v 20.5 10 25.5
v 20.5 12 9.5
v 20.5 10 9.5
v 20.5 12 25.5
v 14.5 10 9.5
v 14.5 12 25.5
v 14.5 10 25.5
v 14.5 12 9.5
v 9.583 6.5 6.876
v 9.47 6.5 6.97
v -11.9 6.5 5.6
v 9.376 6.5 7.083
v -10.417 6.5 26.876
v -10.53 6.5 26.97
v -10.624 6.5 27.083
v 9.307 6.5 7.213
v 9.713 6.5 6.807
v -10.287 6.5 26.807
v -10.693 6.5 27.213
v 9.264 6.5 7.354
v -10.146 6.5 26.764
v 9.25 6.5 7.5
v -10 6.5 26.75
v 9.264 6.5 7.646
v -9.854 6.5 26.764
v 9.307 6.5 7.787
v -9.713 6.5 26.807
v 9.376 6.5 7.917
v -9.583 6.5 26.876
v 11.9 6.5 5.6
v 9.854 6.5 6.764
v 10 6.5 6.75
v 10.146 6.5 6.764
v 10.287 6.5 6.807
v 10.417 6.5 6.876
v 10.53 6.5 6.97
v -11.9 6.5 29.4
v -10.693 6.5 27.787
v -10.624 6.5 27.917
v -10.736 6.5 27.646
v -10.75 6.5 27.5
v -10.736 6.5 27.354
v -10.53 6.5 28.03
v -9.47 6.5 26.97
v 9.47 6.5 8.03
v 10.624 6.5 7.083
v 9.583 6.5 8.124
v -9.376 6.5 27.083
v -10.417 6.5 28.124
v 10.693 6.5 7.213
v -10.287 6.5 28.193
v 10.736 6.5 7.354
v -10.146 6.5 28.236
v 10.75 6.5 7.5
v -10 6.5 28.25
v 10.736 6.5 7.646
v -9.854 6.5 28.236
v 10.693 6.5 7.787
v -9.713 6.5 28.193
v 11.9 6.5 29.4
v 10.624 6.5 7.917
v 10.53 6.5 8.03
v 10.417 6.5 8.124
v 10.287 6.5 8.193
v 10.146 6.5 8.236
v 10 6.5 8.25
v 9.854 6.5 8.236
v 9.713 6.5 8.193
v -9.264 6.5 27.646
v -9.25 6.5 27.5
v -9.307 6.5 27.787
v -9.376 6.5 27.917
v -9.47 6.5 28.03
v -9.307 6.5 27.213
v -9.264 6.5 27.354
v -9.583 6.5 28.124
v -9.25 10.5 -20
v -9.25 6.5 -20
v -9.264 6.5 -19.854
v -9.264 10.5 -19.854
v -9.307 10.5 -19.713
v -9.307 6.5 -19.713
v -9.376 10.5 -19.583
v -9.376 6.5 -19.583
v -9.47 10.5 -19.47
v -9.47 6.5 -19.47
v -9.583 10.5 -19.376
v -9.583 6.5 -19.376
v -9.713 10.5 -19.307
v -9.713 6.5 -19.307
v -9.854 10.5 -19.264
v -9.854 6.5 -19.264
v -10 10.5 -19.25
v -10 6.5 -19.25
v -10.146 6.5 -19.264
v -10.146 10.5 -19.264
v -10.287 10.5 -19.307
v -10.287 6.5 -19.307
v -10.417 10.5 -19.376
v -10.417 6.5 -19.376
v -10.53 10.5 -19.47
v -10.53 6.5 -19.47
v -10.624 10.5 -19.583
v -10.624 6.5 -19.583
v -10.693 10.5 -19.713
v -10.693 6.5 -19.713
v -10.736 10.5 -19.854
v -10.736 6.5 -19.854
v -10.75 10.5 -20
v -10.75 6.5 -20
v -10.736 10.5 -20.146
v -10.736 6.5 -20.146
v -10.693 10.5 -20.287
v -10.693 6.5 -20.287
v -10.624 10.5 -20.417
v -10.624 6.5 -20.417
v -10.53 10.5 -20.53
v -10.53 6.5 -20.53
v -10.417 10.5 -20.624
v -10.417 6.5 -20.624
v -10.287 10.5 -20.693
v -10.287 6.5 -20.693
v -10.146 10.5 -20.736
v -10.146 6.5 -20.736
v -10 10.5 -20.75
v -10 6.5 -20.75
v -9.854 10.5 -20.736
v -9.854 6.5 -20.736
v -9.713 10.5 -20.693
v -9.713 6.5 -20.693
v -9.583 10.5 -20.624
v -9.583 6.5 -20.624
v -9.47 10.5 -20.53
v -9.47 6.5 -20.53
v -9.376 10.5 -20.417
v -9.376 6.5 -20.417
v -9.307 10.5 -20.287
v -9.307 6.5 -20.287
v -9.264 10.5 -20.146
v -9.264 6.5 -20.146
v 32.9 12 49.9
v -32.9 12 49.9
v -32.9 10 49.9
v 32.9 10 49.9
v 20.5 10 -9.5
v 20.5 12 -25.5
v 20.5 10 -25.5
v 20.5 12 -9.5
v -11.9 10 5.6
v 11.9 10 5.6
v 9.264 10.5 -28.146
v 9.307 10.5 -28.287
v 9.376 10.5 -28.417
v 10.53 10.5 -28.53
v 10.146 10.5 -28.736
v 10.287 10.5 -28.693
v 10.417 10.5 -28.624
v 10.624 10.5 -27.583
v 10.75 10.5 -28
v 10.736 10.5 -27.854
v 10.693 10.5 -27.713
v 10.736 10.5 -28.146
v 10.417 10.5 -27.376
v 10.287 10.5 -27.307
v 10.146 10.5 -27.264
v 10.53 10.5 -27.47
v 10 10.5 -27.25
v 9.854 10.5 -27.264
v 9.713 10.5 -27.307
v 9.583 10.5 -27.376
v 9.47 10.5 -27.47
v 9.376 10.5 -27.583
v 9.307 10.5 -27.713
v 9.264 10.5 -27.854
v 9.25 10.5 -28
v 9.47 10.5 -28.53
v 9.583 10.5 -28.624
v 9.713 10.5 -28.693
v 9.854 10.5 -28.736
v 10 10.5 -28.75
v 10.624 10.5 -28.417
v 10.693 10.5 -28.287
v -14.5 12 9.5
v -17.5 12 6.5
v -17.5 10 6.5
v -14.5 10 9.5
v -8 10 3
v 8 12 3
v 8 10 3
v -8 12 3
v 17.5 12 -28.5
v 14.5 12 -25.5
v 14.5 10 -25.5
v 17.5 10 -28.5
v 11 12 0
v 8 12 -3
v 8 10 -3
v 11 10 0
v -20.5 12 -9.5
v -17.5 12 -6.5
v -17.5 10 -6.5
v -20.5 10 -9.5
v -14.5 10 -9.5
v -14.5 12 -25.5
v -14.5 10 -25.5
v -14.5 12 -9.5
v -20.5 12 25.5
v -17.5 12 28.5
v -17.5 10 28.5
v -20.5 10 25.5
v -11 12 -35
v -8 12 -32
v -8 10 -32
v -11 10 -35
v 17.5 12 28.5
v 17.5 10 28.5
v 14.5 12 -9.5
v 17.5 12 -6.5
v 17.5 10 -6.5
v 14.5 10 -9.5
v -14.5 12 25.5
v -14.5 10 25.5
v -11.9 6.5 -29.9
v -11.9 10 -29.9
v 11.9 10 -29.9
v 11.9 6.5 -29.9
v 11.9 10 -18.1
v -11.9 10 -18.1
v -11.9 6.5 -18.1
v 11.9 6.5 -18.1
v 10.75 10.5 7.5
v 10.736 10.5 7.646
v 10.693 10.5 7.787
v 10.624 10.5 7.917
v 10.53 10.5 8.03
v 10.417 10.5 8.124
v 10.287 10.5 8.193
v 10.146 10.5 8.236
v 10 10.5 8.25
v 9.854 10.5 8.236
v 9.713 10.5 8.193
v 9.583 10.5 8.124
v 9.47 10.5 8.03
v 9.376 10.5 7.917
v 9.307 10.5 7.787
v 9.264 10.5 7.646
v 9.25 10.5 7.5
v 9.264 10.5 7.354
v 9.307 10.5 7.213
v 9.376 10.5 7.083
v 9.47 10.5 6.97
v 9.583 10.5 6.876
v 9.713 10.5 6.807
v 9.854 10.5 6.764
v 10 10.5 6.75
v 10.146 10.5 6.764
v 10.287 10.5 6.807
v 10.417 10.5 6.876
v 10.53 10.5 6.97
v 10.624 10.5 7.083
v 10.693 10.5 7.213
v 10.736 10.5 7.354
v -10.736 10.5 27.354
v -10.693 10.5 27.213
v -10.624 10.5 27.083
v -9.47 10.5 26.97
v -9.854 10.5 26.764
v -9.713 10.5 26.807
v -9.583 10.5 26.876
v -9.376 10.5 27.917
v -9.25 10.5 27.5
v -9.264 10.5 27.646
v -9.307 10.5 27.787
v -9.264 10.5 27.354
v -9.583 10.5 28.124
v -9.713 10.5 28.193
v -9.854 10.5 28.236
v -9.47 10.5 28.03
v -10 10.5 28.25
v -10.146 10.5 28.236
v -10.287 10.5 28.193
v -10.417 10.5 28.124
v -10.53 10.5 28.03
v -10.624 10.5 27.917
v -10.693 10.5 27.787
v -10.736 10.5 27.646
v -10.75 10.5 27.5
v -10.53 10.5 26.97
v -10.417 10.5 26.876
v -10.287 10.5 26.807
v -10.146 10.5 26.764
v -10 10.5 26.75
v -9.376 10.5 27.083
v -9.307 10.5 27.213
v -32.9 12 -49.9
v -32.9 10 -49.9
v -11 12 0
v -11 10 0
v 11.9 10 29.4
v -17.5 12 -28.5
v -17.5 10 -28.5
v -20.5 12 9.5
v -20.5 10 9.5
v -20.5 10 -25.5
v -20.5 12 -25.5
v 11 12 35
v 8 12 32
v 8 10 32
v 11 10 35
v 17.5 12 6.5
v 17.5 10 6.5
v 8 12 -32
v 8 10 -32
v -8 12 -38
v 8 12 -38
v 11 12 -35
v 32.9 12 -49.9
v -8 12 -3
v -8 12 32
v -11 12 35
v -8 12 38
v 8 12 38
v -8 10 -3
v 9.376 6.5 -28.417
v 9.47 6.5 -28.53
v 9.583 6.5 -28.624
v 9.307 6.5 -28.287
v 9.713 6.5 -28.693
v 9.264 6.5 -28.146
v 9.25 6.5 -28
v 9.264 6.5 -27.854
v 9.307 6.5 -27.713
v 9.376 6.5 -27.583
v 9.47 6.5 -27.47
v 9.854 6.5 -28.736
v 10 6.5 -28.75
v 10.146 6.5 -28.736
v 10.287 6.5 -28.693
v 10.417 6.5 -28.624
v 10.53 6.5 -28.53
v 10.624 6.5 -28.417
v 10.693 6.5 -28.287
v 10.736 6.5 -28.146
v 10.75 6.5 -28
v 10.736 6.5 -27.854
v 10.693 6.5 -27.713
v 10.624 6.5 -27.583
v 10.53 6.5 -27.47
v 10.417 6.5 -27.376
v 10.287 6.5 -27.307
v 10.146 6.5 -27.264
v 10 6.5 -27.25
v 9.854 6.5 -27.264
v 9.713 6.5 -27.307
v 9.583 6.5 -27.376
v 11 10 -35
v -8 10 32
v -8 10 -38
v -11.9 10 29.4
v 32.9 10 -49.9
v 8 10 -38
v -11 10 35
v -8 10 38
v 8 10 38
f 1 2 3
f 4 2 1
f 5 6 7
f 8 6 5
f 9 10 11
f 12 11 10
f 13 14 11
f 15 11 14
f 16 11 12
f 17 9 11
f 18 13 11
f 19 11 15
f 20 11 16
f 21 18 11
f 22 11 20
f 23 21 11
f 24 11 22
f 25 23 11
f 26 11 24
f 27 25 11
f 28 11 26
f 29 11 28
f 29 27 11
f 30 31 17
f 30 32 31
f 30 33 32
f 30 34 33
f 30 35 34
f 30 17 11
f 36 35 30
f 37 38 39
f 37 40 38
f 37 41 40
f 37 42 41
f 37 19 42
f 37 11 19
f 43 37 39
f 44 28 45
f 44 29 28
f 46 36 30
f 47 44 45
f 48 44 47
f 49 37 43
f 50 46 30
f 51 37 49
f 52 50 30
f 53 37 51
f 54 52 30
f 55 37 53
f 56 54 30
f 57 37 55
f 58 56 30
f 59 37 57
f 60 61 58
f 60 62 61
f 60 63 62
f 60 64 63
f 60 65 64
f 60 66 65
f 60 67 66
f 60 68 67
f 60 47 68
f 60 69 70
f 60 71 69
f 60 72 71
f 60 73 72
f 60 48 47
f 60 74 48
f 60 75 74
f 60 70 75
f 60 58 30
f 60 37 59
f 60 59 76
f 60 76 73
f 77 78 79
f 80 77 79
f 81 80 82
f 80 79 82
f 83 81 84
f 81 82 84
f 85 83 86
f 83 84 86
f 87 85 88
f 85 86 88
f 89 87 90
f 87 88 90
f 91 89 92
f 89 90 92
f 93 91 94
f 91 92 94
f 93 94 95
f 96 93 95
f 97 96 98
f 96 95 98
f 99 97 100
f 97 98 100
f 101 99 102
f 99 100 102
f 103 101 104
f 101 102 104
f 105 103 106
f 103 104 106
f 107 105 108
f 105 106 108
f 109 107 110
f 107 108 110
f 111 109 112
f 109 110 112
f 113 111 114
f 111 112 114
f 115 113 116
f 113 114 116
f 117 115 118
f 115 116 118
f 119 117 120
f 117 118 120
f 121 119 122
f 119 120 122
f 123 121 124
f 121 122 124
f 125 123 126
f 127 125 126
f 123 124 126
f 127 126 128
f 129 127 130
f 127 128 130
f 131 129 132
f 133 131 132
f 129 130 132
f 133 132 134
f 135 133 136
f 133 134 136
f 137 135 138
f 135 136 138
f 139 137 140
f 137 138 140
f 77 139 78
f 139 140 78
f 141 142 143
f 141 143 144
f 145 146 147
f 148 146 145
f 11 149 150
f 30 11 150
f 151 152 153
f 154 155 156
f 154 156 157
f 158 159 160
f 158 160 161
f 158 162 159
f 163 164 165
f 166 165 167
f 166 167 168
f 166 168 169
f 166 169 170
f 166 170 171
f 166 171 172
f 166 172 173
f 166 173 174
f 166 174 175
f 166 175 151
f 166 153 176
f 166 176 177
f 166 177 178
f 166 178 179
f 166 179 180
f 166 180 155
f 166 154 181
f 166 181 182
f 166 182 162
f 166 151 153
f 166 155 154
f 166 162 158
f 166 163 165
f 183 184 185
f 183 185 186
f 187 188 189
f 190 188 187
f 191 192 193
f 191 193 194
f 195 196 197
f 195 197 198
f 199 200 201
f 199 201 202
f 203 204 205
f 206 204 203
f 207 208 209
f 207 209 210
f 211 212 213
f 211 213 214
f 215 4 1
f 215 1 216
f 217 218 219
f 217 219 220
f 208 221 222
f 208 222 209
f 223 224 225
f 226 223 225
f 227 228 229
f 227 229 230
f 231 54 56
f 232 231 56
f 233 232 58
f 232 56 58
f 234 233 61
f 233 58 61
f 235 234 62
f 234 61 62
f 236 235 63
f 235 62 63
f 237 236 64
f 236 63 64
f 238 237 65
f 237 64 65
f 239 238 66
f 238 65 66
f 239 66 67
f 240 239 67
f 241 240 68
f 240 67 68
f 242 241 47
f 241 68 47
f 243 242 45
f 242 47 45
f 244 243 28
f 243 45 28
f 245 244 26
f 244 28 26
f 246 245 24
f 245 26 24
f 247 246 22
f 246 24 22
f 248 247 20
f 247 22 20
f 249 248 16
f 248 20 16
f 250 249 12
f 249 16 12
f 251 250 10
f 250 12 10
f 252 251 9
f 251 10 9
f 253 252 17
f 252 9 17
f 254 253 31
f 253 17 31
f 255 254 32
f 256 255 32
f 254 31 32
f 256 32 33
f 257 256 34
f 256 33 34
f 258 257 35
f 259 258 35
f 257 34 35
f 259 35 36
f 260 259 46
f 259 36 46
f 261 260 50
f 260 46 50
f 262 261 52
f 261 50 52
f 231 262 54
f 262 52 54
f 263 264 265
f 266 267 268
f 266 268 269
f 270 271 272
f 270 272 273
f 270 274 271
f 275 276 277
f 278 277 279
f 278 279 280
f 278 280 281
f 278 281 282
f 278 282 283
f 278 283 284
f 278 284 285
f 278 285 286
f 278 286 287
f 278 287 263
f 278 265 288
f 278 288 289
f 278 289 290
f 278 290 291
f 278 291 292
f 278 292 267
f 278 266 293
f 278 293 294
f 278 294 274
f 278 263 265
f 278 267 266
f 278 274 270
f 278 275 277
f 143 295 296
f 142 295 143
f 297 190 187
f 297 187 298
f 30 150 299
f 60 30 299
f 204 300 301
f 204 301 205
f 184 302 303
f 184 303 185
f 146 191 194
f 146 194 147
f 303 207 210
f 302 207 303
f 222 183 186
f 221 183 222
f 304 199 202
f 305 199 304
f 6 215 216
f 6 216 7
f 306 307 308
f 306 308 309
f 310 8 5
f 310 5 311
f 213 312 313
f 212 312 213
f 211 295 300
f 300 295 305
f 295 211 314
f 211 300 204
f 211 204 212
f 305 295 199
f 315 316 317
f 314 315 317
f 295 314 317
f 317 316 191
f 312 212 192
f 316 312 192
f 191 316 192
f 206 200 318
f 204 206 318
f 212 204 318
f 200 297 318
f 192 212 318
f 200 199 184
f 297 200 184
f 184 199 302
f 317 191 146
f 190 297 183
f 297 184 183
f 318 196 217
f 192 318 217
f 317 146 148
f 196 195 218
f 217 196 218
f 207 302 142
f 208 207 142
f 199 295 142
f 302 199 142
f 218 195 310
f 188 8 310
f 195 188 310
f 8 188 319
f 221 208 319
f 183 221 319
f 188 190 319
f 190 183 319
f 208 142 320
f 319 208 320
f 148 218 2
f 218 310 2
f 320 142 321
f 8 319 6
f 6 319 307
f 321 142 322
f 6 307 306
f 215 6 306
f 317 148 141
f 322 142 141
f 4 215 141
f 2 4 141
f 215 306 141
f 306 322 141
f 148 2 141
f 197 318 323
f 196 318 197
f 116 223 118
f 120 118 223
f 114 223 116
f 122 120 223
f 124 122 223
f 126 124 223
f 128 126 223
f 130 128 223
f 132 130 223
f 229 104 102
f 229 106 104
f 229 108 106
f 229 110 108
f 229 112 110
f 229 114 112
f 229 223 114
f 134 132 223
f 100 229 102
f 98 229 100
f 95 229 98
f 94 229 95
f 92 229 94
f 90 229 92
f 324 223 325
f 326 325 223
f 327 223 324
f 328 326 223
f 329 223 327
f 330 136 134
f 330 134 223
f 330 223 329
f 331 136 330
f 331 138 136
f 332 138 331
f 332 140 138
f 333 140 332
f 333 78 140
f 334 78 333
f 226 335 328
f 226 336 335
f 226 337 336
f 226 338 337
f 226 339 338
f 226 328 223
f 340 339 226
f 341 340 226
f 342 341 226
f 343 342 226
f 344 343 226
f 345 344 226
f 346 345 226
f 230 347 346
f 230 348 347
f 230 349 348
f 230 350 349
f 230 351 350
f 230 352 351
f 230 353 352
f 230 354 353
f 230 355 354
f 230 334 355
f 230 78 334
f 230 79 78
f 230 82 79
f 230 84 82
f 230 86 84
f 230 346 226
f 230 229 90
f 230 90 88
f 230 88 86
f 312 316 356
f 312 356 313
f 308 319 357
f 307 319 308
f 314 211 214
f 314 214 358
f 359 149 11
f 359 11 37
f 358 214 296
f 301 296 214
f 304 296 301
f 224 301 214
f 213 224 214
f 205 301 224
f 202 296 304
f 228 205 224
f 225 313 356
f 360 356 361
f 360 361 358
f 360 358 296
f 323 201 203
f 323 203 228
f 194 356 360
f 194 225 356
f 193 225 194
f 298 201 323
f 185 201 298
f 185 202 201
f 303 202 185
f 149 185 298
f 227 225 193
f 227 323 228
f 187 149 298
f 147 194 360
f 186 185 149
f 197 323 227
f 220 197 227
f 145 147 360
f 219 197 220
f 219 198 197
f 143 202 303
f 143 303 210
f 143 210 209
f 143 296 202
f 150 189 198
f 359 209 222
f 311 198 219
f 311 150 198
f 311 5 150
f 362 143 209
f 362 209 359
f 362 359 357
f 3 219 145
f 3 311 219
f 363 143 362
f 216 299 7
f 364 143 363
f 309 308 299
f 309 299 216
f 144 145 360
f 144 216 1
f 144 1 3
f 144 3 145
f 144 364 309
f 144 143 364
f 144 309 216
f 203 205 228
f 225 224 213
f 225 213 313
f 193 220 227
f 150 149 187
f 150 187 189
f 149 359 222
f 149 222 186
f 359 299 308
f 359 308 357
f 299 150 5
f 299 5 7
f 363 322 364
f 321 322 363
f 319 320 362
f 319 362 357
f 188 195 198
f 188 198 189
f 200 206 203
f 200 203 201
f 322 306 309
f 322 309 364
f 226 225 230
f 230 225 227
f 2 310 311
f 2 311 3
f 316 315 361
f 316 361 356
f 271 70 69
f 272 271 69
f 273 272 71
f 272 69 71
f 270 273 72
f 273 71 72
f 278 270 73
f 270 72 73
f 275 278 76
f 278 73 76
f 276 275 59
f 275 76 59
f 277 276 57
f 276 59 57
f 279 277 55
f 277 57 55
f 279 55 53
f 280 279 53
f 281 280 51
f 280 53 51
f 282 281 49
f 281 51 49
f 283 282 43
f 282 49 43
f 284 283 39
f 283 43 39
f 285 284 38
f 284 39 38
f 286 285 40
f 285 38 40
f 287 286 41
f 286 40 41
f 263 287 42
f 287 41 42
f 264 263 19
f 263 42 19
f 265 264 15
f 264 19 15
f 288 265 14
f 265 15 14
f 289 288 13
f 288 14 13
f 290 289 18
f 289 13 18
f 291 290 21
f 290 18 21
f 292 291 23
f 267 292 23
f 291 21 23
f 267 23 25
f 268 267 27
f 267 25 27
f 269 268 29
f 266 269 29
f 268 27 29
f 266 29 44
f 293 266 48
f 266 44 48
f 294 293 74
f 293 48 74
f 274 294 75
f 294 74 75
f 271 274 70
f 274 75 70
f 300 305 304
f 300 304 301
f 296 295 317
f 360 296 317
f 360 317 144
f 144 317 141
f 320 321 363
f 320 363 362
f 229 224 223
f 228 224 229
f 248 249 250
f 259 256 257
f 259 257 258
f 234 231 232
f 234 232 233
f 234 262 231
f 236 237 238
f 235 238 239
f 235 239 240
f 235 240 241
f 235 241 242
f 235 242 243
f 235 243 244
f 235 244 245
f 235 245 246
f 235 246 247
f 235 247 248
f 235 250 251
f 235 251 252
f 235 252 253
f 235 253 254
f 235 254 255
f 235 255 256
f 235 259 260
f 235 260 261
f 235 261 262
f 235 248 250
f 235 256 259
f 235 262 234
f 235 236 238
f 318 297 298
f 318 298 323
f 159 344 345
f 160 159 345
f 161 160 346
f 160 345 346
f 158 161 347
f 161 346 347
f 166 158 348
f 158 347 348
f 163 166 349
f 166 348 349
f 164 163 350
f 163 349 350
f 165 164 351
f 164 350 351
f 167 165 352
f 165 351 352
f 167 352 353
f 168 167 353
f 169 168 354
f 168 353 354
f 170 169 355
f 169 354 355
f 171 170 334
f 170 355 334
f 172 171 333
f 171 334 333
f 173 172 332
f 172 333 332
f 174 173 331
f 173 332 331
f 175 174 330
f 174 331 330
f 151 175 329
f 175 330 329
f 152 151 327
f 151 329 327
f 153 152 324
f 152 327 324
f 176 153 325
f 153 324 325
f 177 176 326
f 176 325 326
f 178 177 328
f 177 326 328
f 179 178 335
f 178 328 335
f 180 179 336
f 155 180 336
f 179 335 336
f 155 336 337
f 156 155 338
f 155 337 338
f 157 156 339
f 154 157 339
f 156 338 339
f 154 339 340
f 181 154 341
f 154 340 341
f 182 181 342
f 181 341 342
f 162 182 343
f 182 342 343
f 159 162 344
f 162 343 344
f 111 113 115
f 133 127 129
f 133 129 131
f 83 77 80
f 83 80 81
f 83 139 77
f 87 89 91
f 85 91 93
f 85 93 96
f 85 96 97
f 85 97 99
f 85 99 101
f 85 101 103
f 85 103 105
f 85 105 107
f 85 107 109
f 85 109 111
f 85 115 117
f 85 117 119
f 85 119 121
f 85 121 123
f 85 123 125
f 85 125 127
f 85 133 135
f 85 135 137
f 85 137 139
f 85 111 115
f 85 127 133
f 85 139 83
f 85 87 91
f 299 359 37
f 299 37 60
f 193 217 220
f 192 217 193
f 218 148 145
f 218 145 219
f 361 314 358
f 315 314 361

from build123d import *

# Parameters (mm, degrees)
SKETCH024_W     = 65.8
SKETCH024_H     = 99.8
PAD016_DEPTH    = 2
SKETCH166_W     = 23.8
SKETCH166_H     = 23.8
SKETCH166_H_2   = 11.8
PAD112_DEPTH    = 3.5
SKETCH302_R     = 0.75
POCKET047_DEPTH = 4


with BuildPart() as part:
    # Sketch024 → Pad016 (new body)
    with BuildSketch(Plane.XZ):
        Rectangle(SKETCH024_W, SKETCH024_H)
        Polygon((8, 38), (-8, 38), (-11, 35), (-8, 32), (8, 32), (11, 35), align=None, mode=Mode.SUBTRACT)
        Polygon((-14.5, 25.5), (-17.5, 28.5), (-20.5, 25.5), (-20.5, 9.5), (-17.5, 6.5), (-14.5, 9.5), align=None, mode=Mode.SUBTRACT)
        Polygon((-14.5, -9.5), (-17.5, -6.5), (-20.5, -9.5), (-20.5, -25.5), (-17.5, -28.5), (-14.5, -25.5), align=None, mode=Mode.SUBTRACT)
        Polygon((8, -32), (-8, -32), (-11, -35), (-8, -38), (8, -38), (11, -35), align=None, mode=Mode.SUBTRACT)
        Polygon((20.5, 25.5), (17.5, 28.5), (14.5, 25.5), (14.5, 9.5), (17.5, 6.5), (20.5, 9.5), align=None, mode=Mode.SUBTRACT)
        Polygon((20.5, -9.5), (17.5, -6.5), (14.5, -9.5), (14.5, -25.5), (17.5, -28.5), (20.5, -25.5), align=None, mode=Mode.SUBTRACT)
        Polygon((8, 3), (-8, 3), (-11, 0), (-8, -3), (8, -3), (11, 0), align=None, mode=Mode.SUBTRACT)
    extrude(amount=PAD016_DEPTH)

    # Sketch166 (on Face48 of Pad016) → Pad112 (join)
    with BuildSketch(Plane.XZ.offset(2)):
        with Locations((0, 17.5)):
            Rectangle(SKETCH166_W, SKETCH166_H)
        with Locations((0, -24)):
            Rectangle(SKETCH166_W, SKETCH166_H_2)
    extrude(amount=PAD112_DEPTH)

    # Sketch302 (on Face58 of Pad112) → Pocket047 (cut)
    with BuildSketch(Plane.XZ.offset(5.5)):
        with Locations((-10, 27.5)):
            Circle(SKETCH302_R)
        with Locations((10, 7.5)):
            Circle(SKETCH302_R)
        with Locations((-10, -20)):
            Circle(SKETCH302_R)
        with Locations((10, -28)):
            Circle(SKETCH302_R)
    extrude(amount=-POCKET047_DEPTH, mode=Mode.SUBTRACT)


with BuildPart() as part_1:
    # Body009 placement: moved
    add(part.part.moved(Location((0, 12, 0))))


solid = part_1.part
